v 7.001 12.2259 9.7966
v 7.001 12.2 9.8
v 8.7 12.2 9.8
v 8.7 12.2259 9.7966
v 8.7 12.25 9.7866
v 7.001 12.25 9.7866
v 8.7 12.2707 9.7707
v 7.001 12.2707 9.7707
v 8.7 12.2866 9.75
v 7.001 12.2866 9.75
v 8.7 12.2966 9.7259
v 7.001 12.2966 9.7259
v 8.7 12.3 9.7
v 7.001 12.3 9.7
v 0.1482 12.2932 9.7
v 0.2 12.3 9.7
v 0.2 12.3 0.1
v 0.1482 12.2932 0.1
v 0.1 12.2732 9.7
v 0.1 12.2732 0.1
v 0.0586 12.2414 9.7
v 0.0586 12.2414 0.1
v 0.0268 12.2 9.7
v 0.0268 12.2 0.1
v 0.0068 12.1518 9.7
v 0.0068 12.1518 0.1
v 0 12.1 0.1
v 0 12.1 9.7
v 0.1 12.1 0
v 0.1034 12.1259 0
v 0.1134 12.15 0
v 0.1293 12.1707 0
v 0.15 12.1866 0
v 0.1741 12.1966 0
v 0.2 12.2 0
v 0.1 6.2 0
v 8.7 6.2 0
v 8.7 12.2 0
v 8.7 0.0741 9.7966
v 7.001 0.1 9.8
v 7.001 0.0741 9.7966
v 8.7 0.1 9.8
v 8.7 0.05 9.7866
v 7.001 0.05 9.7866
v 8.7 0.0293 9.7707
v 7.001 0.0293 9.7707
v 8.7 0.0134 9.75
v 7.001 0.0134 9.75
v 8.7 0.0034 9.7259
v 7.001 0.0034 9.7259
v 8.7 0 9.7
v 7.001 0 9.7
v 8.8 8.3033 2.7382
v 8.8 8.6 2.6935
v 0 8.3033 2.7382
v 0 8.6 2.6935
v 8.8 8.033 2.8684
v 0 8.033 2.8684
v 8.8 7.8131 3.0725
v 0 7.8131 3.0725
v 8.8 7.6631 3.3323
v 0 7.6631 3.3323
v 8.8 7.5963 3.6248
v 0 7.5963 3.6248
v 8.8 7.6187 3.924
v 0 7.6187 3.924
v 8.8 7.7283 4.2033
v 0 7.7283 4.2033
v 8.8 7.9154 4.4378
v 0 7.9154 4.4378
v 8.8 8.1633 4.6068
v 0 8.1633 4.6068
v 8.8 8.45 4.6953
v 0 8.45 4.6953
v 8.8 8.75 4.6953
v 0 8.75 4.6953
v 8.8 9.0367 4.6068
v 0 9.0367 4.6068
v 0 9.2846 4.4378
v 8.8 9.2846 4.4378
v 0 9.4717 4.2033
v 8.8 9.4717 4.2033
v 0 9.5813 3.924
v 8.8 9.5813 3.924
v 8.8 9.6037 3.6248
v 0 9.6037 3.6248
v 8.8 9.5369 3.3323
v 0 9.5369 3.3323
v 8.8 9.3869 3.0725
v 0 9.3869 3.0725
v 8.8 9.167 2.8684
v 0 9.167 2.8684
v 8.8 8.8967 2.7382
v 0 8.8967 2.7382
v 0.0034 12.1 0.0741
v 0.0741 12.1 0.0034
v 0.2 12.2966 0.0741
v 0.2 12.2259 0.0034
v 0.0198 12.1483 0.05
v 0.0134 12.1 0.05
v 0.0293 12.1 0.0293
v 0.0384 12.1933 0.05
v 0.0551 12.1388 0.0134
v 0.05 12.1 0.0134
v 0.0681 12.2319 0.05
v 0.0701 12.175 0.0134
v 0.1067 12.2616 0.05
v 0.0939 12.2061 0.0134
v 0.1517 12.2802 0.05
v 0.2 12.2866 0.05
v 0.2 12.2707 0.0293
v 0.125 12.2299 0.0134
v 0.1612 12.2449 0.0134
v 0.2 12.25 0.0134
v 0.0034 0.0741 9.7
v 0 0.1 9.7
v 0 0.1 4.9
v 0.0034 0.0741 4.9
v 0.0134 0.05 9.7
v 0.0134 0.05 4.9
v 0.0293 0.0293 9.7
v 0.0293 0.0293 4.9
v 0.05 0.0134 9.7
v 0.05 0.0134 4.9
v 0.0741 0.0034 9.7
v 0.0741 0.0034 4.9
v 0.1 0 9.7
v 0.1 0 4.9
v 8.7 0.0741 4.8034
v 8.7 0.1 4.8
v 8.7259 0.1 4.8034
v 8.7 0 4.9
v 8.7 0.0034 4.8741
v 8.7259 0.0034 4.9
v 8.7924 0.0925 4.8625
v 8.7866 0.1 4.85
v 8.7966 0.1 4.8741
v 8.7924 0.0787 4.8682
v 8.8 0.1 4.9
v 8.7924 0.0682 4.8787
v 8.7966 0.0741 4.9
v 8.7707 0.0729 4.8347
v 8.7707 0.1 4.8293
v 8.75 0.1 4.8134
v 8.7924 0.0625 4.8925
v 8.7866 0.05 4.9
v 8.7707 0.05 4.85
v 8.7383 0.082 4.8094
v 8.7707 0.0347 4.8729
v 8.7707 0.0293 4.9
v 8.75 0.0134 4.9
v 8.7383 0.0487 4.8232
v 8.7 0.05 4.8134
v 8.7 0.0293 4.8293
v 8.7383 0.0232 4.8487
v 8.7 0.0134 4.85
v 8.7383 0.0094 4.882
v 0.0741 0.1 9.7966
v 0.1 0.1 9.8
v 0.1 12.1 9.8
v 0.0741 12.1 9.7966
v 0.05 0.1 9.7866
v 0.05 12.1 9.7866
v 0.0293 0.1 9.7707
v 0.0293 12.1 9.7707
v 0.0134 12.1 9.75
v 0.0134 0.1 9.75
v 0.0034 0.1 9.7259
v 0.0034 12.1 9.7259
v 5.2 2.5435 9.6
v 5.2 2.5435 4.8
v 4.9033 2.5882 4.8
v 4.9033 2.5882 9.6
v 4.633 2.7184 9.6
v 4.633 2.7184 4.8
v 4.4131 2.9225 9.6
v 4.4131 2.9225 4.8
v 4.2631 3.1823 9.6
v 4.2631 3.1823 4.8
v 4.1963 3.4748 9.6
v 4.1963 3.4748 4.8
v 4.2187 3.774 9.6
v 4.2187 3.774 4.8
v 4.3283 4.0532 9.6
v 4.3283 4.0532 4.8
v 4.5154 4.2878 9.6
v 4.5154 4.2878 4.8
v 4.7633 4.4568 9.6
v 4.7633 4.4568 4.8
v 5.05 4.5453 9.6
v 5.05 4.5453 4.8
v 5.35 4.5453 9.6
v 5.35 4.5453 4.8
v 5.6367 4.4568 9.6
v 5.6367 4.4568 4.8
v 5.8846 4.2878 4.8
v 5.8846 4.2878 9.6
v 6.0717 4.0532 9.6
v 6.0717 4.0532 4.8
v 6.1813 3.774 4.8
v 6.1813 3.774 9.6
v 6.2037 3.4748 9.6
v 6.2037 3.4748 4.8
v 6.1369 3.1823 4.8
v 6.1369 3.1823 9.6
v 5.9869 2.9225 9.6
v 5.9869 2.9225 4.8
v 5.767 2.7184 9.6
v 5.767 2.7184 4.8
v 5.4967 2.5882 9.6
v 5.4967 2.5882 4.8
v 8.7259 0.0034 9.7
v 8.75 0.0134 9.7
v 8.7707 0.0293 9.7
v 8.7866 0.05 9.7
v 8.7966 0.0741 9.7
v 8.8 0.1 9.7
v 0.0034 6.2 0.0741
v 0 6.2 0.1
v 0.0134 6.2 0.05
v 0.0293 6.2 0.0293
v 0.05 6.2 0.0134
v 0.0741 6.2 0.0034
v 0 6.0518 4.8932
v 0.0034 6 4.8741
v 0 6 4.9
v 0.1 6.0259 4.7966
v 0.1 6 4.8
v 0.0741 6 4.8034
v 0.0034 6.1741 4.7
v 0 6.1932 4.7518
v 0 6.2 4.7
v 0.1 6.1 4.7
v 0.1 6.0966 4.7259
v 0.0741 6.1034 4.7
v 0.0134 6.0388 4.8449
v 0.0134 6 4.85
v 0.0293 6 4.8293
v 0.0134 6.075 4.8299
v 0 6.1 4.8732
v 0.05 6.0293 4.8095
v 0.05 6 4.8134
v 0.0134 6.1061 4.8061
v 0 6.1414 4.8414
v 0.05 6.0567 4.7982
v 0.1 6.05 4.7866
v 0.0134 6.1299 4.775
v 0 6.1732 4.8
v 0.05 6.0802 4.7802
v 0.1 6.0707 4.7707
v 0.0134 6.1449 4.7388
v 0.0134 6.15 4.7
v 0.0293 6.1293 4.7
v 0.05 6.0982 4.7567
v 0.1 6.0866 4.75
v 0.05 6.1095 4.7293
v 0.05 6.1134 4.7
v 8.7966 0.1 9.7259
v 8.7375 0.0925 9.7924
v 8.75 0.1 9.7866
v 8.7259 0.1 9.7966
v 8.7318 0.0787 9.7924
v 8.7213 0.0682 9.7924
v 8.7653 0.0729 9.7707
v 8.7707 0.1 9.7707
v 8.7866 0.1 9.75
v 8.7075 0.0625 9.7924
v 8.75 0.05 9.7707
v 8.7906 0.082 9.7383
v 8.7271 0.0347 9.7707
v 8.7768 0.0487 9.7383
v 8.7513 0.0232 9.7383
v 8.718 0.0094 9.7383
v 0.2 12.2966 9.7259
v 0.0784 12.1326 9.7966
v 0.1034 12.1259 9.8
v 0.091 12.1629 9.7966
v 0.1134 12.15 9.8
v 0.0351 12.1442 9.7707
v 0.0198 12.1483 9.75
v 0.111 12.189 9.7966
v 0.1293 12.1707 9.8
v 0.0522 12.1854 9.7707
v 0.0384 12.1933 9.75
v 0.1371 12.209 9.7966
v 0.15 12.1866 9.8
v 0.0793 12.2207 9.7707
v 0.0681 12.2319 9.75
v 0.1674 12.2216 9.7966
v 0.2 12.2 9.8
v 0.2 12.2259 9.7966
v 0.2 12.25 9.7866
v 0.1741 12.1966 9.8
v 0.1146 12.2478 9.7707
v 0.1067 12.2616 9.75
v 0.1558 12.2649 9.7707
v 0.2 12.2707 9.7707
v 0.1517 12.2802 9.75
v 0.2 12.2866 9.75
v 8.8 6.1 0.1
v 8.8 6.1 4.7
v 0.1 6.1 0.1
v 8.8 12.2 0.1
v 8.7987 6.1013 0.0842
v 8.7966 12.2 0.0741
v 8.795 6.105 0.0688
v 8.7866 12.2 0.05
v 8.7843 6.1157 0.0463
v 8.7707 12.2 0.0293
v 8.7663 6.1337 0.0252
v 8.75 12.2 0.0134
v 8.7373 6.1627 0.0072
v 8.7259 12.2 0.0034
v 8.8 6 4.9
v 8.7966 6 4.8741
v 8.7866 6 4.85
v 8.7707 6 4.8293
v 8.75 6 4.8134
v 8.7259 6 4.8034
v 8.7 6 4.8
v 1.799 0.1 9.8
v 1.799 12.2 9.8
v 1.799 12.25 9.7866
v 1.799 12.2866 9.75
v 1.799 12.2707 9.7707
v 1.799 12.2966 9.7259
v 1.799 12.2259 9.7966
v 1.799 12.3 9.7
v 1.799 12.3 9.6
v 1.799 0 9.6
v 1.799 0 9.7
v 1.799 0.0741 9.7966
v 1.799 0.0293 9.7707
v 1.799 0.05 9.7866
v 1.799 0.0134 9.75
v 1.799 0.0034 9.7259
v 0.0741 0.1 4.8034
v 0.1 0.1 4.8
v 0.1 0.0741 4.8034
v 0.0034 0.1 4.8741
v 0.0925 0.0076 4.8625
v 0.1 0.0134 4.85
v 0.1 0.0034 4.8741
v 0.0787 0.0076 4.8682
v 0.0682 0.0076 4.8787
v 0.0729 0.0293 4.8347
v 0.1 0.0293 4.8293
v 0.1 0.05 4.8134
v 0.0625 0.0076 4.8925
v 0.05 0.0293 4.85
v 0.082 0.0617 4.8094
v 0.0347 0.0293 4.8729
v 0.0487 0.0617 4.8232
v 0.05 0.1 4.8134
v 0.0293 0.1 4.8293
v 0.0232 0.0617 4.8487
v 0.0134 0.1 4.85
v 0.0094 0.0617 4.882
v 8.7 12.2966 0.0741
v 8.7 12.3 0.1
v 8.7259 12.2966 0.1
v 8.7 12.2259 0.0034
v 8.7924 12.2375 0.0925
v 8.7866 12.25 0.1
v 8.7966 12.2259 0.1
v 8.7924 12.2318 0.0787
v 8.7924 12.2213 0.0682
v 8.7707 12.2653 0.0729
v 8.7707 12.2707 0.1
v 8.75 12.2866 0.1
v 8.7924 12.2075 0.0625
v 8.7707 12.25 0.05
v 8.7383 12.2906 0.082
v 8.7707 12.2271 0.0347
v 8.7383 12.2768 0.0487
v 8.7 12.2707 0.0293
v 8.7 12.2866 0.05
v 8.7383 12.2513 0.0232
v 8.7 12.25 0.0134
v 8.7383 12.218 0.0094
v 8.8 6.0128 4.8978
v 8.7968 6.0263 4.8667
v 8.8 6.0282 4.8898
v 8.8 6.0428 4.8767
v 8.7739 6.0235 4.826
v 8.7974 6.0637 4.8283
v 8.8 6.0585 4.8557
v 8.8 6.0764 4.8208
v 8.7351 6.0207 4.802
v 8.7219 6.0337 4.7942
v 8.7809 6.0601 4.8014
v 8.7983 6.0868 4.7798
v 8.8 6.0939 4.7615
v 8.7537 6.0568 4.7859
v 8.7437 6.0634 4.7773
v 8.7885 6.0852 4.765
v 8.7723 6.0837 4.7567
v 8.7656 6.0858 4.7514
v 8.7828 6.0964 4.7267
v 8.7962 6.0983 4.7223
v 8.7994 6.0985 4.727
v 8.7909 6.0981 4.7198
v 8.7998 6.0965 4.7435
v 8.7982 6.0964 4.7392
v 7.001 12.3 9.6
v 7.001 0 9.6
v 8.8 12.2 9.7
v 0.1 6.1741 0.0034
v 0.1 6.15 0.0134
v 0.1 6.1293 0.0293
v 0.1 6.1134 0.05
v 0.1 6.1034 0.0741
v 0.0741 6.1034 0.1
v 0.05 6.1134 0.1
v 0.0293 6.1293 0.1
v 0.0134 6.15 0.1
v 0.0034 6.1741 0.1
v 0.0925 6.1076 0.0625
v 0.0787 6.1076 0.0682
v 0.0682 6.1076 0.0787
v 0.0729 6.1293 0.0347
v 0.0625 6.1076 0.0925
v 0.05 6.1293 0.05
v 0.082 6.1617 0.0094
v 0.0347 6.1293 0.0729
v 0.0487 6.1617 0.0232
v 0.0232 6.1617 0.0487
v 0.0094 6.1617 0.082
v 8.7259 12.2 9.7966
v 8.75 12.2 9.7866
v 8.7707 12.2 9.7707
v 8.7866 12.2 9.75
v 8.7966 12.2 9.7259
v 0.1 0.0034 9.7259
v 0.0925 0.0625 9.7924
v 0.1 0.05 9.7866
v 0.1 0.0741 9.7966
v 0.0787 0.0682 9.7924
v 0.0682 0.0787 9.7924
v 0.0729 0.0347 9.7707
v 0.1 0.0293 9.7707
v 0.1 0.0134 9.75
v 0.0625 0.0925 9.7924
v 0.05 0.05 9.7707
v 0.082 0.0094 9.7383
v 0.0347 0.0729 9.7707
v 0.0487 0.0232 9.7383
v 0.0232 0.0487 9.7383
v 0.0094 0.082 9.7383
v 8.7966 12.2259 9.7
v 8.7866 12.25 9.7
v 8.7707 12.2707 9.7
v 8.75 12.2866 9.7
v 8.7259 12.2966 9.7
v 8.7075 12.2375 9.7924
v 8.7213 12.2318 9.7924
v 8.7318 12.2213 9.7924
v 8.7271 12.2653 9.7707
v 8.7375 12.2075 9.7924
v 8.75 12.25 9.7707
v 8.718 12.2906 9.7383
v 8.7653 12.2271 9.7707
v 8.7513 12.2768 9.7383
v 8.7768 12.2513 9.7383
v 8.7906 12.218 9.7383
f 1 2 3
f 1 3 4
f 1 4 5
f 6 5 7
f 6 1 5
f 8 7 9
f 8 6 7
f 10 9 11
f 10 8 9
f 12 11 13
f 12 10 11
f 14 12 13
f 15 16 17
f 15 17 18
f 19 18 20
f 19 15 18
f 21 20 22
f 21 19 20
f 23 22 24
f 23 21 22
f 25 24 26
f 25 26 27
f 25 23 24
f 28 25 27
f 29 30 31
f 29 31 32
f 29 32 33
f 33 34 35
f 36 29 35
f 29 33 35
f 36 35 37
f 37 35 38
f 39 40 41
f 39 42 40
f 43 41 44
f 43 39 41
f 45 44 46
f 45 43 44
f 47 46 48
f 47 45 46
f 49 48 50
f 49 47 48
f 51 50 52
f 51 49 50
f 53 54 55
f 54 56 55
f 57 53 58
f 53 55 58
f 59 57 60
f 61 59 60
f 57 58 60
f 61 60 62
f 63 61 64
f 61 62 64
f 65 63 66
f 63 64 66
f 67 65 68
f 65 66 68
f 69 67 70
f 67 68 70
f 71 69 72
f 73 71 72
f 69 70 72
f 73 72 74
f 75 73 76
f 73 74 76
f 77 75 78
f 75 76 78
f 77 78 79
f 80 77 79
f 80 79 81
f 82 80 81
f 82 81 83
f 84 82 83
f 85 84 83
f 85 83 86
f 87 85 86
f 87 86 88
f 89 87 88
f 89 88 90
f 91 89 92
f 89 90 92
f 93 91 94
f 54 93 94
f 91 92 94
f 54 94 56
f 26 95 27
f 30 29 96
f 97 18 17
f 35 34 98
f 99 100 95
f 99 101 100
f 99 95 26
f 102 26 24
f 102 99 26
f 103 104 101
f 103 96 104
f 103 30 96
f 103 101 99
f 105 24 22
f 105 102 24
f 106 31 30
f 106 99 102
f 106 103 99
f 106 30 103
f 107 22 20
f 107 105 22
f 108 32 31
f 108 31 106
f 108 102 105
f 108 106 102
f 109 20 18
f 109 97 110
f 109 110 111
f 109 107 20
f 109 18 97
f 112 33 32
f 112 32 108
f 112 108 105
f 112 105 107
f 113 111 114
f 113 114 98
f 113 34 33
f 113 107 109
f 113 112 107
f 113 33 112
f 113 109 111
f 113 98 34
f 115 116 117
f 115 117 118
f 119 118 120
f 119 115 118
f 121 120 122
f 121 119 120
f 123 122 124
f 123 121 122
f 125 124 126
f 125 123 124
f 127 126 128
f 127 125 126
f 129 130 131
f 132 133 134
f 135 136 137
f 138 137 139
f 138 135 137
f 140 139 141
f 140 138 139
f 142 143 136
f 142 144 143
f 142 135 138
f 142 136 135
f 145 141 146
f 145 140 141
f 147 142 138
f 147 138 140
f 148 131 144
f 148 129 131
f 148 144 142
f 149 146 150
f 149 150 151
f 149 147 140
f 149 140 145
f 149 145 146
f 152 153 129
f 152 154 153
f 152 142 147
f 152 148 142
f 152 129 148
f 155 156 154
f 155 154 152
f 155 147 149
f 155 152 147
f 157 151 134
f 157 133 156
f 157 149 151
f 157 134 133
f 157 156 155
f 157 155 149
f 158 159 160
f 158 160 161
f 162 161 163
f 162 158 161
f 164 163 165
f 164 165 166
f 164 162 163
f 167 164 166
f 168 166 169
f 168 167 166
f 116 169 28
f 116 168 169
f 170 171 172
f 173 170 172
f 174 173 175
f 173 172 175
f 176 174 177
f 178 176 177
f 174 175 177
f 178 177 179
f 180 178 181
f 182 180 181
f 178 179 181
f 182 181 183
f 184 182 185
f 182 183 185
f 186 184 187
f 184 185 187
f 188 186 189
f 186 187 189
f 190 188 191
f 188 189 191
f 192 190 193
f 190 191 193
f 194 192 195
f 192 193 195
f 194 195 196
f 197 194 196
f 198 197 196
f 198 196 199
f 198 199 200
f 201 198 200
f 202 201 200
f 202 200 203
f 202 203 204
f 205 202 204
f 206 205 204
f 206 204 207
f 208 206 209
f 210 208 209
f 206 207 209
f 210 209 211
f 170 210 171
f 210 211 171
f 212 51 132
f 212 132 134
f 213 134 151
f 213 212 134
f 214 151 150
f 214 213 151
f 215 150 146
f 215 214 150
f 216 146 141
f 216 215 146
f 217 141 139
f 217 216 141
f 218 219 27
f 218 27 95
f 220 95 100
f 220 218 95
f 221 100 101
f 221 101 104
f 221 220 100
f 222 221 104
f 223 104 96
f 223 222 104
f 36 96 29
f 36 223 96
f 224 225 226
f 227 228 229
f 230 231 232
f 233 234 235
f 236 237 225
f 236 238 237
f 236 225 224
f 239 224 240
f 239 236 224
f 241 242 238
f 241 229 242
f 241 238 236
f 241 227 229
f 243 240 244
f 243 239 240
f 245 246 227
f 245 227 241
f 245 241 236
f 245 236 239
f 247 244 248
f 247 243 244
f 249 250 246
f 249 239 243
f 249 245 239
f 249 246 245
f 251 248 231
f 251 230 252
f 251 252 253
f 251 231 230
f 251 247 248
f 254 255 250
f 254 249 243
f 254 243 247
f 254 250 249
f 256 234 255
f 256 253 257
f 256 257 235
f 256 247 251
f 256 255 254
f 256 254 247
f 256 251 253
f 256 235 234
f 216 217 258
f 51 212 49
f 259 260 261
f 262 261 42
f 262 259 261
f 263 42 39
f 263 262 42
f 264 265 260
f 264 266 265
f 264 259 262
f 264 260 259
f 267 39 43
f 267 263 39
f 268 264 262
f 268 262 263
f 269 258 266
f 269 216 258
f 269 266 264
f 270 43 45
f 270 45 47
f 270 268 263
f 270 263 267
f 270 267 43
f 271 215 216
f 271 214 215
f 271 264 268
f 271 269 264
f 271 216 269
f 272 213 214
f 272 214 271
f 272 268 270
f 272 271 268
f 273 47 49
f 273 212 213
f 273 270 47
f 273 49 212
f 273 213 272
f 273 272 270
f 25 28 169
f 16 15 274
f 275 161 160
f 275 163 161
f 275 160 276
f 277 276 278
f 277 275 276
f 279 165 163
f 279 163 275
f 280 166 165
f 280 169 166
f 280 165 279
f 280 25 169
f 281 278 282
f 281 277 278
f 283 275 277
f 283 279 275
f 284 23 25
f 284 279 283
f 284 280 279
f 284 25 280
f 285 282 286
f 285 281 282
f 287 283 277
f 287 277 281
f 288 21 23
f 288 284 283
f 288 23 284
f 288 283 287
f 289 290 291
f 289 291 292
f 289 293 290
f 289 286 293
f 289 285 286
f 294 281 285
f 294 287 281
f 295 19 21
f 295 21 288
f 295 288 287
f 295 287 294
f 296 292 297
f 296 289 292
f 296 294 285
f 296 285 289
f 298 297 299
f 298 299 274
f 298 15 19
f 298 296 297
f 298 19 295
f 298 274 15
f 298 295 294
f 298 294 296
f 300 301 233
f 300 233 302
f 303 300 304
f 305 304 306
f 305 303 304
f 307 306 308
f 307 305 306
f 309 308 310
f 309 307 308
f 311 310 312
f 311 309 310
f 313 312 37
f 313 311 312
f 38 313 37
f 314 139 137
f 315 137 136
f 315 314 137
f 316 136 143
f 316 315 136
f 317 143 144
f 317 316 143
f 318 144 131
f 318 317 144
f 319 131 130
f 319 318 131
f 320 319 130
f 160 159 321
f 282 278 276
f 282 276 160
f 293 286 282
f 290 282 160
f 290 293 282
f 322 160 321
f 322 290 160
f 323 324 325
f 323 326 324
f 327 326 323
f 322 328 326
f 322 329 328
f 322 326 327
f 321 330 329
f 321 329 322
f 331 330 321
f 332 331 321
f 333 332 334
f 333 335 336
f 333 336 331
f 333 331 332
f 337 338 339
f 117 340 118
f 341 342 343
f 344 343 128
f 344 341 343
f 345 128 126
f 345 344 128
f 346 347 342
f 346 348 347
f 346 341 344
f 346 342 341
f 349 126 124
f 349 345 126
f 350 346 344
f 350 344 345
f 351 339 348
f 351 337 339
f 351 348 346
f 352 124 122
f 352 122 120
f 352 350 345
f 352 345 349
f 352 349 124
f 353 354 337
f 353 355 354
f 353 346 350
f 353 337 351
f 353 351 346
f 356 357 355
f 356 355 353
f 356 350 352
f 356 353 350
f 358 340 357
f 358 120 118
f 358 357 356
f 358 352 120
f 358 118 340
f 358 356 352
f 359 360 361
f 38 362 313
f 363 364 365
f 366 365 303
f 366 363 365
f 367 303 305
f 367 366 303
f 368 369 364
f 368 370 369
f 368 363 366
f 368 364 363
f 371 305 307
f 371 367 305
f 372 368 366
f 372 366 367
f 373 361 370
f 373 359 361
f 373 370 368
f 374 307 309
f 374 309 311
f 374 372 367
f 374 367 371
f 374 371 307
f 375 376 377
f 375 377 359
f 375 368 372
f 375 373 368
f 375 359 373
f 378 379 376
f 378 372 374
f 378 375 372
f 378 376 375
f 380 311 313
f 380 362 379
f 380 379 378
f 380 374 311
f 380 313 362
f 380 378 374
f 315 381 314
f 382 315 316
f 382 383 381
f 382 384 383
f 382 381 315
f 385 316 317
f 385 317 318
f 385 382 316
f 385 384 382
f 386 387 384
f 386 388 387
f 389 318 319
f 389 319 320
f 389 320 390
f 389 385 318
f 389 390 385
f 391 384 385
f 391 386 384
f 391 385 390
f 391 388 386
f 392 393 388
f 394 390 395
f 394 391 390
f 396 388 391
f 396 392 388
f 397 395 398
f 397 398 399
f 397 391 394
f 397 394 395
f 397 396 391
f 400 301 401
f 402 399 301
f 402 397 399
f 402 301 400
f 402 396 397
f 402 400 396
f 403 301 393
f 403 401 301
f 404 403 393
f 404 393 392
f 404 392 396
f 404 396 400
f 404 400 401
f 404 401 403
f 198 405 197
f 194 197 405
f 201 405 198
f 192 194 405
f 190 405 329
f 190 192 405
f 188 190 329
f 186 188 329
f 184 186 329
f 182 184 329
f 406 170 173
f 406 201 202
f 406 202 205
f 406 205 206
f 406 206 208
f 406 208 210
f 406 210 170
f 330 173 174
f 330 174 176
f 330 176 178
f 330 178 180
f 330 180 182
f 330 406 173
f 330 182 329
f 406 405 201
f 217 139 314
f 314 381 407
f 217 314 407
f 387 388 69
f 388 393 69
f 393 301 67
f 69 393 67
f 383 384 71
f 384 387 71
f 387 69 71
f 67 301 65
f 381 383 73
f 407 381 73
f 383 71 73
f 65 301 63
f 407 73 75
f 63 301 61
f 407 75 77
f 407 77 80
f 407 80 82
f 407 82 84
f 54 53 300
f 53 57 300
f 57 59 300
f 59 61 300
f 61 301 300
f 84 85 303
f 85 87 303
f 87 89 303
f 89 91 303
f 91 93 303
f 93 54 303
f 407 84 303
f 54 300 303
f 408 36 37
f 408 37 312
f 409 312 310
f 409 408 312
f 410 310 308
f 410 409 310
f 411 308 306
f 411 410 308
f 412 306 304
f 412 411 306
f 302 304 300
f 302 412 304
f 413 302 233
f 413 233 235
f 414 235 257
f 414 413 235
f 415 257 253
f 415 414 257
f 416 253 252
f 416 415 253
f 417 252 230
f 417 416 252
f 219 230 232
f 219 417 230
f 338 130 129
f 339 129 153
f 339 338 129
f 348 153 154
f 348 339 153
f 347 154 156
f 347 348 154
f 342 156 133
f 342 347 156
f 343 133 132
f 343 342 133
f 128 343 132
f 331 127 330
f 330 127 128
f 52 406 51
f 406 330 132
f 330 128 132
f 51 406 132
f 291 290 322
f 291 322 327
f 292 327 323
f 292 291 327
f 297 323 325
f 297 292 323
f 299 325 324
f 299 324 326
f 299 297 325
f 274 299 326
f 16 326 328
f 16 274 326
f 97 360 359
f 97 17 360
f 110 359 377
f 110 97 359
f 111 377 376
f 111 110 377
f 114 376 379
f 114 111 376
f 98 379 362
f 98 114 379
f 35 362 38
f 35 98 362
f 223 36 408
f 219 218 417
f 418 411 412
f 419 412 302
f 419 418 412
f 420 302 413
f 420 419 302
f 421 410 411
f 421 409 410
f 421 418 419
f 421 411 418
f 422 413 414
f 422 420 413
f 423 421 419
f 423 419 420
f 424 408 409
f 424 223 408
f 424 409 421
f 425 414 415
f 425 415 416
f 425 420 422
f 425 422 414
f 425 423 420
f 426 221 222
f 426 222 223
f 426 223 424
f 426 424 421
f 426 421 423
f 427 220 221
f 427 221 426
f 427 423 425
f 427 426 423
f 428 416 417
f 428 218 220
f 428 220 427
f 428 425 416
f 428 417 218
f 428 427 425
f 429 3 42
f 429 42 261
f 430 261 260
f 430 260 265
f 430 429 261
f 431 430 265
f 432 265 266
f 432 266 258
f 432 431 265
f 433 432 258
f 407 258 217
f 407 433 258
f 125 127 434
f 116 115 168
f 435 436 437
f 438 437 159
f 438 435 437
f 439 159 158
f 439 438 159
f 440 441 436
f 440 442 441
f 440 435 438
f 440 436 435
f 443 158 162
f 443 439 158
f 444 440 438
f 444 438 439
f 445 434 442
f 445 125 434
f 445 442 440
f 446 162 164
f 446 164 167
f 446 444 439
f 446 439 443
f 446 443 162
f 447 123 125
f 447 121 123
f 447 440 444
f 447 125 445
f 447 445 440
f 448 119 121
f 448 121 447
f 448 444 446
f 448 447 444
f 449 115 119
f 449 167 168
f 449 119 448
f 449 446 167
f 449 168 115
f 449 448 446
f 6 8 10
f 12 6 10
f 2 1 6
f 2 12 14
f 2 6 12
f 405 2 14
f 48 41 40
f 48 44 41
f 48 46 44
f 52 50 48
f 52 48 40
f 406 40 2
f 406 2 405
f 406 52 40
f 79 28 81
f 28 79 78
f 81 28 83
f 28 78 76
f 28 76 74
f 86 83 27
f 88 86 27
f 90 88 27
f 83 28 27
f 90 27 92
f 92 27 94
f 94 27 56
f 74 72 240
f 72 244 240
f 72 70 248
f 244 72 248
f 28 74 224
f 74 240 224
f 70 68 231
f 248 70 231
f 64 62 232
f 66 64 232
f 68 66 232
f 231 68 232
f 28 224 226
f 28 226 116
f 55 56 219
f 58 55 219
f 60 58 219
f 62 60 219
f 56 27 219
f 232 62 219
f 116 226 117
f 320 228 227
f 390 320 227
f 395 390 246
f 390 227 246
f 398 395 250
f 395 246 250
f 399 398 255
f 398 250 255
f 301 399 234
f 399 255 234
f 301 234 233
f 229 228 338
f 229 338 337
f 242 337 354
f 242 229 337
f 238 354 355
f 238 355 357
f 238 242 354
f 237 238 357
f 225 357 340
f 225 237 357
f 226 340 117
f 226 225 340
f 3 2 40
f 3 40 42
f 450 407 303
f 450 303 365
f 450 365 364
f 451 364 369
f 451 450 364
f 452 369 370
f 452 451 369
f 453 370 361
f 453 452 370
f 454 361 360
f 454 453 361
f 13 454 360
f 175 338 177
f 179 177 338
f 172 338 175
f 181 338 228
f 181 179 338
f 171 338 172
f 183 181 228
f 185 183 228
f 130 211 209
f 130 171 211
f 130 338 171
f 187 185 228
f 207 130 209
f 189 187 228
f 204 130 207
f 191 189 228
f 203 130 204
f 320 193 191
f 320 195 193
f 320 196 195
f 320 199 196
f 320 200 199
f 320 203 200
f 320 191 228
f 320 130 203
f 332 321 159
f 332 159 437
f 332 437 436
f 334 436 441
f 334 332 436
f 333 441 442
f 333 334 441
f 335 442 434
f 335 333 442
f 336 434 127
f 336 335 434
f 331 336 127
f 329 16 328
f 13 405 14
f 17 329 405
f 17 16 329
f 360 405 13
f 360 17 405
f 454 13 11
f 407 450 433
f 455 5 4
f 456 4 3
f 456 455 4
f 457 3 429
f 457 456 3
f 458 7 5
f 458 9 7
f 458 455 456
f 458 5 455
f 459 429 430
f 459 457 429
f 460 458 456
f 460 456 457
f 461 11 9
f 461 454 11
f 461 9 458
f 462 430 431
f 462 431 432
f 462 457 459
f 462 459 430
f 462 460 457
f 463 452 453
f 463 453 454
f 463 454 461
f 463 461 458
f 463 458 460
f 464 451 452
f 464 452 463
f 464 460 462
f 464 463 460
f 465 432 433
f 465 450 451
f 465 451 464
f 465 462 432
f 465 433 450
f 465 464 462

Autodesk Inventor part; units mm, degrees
ref_plane "YZ Plane" through (0, 0, 0) normal (1, 0, 0) x (0, 1, 0)
ref_plane "XZ Plane" through (0, 0, 0) normal (0, 1, 0) x (-1, 0, 0)
ref_plane "XY Plane" through (0, 0, 0) normal (0, 0, 1) x (1, 0, 0)
sketch "Skizze1" plane through (0, 0, 0) normal (0, 0, 1) x (1, 0, 0)
  line L0 (0, 12.3) -> (8.8, 12.3)
  line L1 (0, 12.3) -> (0, 0)
  line L2 (0, 0) -> (8.8, 0)
  line L3 (8.8, 0) -> (8.8, 12.3)
  circle A0 centre (5.18, 3.55) radius 1.25
  circle A1 centre (5.18, 3.55) radius 1.25
  line L4 (0, 12.3) -> (8.8, 12.3)
  line L5 (8.8, 12.3) -> (8.8, 0)
  line L6 (8.8, 0) -> (0, 0)
  line L7 (0, 0) -> (0, 12.3)
  dimension "d35" = 8.8
  dimension "d36" = 5.18
extrude "Extrusion1" add sketch "Skizze1" along normal blind 9.8
sketch "Skizze2" plane through (8.8, 0, 0) normal (1, 0, 0) x (0, 0, -1)
  line L0 (0, 0) -> (-9.8, 0) projected
  line L1 (0, 0) -> (0, 12.3) projected
  line L2 (0, 12.3) -> (-9.8, 12.3) projected
  line L3 (-4.8, 6.1) -> (0, 6.1)
  line L4 (0, 6.1) -> (0, 0)
  line L5 (0, 0) -> (-4.8, 0)
  line L6 (-4.8, 0) -> (-4.8, 6.1)
  dimension "d2" = 6.2
  dimension "d3" = 4.8
  dimension "d4" = 6.1
extrude "Extrusion2" cut sketch "Skizze2" against normal blind 9.8
sketch "Skizze3" plane through (8.8, 0, 9.8) normal (1, 0, 0) x (0, 0, -1)
  line L0 (9.8, 6.1) -> (9.8, 12.3) projected
  line L1 (9.8, 12.3) -> (0, 12.3) projected
  point P0 (9.8, 0)
  point P1 (6.1, 8.6)
  dimension "d7" = 3.7
  dimension "d8" = 3.7
hole "Hole1" at (8.8, 8.6, 3.7) direction (-1, 0, 0) diameter 2.013 end through all thread size "M2.5x0.45" class "6H" standard "ANSI Metric M Profile"
sketch "Skizze4" plane through (0, 0, 9.8) normal (0, 0, 1) x (1, 0, 0)
  circle A0 centre (5.18, 3.55) radius 1.25 projected
  circle A1 centre (5.18, 3.55) radius 1.25
extrude "Extrusion3" add sketch "Skizze4" against normal blind 5
sketch "Skizze5" plane through (0, 0, 9.8) normal (0, 0, 1) x (1, 0, 0)
  line L0 (8.8, 0) -> (0, 0) projected
  line L1 (8.8, 12.3) -> (8.8, 0) projected
  point P0 (5.2, 3.55)
  dimension "d18" = 3.6
  dimension "d19" = 3.55
hole "Hole2" at (5.2, 3.55, 9.8) direction (0, 0, -1) diameter 2.013 depth 8 tip angle 118 thread size "M2.5x0.45" class "6H" standard "ANSI Metric M Profile"
fillet "Rundung1" radius 0.2 1 edges at (0, 12.3, 4.9)
fillet "Rundung2" radius 0.1 18 edges at (0, 9.1, 0) (0.0586, 12.2414, 0) (4.5, 12.3, 0) (0, 6.1, 2.4) (0, 3.05, 4.8) (4.4, 0, 4.8) (4.4, 6.1, 4.8) (4.4, 6.1, 0) (8.8, 9.2, 0) (8.8, 3.05, 4.8) (8.8, 0, 7.3) (0, 0, 7.3) (8.8, 12.3, 4.9) (8.8, 6.15, 9.8) (4.4, 0, 9.8) (0, 6.05, 9.8) (0.0586, 12.2414, 9.8) (4.5, 12.3, 9.8)
sketch "Skizze6" plane through (0.1, 0, 9.7) normal (0, -1, 0) x (1, 0, 0)
  line L0 (8.6, 0.1) -> (0, 0.1) projected
  line L1 (-0.1, 0) -> (-0.1, -4.8) projected
  line L2 (8.7, -4.8) -> (8.7, 0) projected
  line L3 (1.699, 0.1) -> (6.901, 0.1)
  line L4 (6.901, 0.1) -> (6.901, -0.1)
  line L5 (6.901, -0.1) -> (1.699, -0.1)
  line L6 (1.699, -0.1) -> (1.699, 0.1)
  point P0 (-0.1, -9.7)
  dimension "d30" = 0.2
  dimension "d31" = 1.799
  dimension "d32" = 1.799
extrude "Extrusion4" cut sketch "Skizze6" against normal blind 12.5
properties part number "3. Leiterplattenhalter_Rechts"
